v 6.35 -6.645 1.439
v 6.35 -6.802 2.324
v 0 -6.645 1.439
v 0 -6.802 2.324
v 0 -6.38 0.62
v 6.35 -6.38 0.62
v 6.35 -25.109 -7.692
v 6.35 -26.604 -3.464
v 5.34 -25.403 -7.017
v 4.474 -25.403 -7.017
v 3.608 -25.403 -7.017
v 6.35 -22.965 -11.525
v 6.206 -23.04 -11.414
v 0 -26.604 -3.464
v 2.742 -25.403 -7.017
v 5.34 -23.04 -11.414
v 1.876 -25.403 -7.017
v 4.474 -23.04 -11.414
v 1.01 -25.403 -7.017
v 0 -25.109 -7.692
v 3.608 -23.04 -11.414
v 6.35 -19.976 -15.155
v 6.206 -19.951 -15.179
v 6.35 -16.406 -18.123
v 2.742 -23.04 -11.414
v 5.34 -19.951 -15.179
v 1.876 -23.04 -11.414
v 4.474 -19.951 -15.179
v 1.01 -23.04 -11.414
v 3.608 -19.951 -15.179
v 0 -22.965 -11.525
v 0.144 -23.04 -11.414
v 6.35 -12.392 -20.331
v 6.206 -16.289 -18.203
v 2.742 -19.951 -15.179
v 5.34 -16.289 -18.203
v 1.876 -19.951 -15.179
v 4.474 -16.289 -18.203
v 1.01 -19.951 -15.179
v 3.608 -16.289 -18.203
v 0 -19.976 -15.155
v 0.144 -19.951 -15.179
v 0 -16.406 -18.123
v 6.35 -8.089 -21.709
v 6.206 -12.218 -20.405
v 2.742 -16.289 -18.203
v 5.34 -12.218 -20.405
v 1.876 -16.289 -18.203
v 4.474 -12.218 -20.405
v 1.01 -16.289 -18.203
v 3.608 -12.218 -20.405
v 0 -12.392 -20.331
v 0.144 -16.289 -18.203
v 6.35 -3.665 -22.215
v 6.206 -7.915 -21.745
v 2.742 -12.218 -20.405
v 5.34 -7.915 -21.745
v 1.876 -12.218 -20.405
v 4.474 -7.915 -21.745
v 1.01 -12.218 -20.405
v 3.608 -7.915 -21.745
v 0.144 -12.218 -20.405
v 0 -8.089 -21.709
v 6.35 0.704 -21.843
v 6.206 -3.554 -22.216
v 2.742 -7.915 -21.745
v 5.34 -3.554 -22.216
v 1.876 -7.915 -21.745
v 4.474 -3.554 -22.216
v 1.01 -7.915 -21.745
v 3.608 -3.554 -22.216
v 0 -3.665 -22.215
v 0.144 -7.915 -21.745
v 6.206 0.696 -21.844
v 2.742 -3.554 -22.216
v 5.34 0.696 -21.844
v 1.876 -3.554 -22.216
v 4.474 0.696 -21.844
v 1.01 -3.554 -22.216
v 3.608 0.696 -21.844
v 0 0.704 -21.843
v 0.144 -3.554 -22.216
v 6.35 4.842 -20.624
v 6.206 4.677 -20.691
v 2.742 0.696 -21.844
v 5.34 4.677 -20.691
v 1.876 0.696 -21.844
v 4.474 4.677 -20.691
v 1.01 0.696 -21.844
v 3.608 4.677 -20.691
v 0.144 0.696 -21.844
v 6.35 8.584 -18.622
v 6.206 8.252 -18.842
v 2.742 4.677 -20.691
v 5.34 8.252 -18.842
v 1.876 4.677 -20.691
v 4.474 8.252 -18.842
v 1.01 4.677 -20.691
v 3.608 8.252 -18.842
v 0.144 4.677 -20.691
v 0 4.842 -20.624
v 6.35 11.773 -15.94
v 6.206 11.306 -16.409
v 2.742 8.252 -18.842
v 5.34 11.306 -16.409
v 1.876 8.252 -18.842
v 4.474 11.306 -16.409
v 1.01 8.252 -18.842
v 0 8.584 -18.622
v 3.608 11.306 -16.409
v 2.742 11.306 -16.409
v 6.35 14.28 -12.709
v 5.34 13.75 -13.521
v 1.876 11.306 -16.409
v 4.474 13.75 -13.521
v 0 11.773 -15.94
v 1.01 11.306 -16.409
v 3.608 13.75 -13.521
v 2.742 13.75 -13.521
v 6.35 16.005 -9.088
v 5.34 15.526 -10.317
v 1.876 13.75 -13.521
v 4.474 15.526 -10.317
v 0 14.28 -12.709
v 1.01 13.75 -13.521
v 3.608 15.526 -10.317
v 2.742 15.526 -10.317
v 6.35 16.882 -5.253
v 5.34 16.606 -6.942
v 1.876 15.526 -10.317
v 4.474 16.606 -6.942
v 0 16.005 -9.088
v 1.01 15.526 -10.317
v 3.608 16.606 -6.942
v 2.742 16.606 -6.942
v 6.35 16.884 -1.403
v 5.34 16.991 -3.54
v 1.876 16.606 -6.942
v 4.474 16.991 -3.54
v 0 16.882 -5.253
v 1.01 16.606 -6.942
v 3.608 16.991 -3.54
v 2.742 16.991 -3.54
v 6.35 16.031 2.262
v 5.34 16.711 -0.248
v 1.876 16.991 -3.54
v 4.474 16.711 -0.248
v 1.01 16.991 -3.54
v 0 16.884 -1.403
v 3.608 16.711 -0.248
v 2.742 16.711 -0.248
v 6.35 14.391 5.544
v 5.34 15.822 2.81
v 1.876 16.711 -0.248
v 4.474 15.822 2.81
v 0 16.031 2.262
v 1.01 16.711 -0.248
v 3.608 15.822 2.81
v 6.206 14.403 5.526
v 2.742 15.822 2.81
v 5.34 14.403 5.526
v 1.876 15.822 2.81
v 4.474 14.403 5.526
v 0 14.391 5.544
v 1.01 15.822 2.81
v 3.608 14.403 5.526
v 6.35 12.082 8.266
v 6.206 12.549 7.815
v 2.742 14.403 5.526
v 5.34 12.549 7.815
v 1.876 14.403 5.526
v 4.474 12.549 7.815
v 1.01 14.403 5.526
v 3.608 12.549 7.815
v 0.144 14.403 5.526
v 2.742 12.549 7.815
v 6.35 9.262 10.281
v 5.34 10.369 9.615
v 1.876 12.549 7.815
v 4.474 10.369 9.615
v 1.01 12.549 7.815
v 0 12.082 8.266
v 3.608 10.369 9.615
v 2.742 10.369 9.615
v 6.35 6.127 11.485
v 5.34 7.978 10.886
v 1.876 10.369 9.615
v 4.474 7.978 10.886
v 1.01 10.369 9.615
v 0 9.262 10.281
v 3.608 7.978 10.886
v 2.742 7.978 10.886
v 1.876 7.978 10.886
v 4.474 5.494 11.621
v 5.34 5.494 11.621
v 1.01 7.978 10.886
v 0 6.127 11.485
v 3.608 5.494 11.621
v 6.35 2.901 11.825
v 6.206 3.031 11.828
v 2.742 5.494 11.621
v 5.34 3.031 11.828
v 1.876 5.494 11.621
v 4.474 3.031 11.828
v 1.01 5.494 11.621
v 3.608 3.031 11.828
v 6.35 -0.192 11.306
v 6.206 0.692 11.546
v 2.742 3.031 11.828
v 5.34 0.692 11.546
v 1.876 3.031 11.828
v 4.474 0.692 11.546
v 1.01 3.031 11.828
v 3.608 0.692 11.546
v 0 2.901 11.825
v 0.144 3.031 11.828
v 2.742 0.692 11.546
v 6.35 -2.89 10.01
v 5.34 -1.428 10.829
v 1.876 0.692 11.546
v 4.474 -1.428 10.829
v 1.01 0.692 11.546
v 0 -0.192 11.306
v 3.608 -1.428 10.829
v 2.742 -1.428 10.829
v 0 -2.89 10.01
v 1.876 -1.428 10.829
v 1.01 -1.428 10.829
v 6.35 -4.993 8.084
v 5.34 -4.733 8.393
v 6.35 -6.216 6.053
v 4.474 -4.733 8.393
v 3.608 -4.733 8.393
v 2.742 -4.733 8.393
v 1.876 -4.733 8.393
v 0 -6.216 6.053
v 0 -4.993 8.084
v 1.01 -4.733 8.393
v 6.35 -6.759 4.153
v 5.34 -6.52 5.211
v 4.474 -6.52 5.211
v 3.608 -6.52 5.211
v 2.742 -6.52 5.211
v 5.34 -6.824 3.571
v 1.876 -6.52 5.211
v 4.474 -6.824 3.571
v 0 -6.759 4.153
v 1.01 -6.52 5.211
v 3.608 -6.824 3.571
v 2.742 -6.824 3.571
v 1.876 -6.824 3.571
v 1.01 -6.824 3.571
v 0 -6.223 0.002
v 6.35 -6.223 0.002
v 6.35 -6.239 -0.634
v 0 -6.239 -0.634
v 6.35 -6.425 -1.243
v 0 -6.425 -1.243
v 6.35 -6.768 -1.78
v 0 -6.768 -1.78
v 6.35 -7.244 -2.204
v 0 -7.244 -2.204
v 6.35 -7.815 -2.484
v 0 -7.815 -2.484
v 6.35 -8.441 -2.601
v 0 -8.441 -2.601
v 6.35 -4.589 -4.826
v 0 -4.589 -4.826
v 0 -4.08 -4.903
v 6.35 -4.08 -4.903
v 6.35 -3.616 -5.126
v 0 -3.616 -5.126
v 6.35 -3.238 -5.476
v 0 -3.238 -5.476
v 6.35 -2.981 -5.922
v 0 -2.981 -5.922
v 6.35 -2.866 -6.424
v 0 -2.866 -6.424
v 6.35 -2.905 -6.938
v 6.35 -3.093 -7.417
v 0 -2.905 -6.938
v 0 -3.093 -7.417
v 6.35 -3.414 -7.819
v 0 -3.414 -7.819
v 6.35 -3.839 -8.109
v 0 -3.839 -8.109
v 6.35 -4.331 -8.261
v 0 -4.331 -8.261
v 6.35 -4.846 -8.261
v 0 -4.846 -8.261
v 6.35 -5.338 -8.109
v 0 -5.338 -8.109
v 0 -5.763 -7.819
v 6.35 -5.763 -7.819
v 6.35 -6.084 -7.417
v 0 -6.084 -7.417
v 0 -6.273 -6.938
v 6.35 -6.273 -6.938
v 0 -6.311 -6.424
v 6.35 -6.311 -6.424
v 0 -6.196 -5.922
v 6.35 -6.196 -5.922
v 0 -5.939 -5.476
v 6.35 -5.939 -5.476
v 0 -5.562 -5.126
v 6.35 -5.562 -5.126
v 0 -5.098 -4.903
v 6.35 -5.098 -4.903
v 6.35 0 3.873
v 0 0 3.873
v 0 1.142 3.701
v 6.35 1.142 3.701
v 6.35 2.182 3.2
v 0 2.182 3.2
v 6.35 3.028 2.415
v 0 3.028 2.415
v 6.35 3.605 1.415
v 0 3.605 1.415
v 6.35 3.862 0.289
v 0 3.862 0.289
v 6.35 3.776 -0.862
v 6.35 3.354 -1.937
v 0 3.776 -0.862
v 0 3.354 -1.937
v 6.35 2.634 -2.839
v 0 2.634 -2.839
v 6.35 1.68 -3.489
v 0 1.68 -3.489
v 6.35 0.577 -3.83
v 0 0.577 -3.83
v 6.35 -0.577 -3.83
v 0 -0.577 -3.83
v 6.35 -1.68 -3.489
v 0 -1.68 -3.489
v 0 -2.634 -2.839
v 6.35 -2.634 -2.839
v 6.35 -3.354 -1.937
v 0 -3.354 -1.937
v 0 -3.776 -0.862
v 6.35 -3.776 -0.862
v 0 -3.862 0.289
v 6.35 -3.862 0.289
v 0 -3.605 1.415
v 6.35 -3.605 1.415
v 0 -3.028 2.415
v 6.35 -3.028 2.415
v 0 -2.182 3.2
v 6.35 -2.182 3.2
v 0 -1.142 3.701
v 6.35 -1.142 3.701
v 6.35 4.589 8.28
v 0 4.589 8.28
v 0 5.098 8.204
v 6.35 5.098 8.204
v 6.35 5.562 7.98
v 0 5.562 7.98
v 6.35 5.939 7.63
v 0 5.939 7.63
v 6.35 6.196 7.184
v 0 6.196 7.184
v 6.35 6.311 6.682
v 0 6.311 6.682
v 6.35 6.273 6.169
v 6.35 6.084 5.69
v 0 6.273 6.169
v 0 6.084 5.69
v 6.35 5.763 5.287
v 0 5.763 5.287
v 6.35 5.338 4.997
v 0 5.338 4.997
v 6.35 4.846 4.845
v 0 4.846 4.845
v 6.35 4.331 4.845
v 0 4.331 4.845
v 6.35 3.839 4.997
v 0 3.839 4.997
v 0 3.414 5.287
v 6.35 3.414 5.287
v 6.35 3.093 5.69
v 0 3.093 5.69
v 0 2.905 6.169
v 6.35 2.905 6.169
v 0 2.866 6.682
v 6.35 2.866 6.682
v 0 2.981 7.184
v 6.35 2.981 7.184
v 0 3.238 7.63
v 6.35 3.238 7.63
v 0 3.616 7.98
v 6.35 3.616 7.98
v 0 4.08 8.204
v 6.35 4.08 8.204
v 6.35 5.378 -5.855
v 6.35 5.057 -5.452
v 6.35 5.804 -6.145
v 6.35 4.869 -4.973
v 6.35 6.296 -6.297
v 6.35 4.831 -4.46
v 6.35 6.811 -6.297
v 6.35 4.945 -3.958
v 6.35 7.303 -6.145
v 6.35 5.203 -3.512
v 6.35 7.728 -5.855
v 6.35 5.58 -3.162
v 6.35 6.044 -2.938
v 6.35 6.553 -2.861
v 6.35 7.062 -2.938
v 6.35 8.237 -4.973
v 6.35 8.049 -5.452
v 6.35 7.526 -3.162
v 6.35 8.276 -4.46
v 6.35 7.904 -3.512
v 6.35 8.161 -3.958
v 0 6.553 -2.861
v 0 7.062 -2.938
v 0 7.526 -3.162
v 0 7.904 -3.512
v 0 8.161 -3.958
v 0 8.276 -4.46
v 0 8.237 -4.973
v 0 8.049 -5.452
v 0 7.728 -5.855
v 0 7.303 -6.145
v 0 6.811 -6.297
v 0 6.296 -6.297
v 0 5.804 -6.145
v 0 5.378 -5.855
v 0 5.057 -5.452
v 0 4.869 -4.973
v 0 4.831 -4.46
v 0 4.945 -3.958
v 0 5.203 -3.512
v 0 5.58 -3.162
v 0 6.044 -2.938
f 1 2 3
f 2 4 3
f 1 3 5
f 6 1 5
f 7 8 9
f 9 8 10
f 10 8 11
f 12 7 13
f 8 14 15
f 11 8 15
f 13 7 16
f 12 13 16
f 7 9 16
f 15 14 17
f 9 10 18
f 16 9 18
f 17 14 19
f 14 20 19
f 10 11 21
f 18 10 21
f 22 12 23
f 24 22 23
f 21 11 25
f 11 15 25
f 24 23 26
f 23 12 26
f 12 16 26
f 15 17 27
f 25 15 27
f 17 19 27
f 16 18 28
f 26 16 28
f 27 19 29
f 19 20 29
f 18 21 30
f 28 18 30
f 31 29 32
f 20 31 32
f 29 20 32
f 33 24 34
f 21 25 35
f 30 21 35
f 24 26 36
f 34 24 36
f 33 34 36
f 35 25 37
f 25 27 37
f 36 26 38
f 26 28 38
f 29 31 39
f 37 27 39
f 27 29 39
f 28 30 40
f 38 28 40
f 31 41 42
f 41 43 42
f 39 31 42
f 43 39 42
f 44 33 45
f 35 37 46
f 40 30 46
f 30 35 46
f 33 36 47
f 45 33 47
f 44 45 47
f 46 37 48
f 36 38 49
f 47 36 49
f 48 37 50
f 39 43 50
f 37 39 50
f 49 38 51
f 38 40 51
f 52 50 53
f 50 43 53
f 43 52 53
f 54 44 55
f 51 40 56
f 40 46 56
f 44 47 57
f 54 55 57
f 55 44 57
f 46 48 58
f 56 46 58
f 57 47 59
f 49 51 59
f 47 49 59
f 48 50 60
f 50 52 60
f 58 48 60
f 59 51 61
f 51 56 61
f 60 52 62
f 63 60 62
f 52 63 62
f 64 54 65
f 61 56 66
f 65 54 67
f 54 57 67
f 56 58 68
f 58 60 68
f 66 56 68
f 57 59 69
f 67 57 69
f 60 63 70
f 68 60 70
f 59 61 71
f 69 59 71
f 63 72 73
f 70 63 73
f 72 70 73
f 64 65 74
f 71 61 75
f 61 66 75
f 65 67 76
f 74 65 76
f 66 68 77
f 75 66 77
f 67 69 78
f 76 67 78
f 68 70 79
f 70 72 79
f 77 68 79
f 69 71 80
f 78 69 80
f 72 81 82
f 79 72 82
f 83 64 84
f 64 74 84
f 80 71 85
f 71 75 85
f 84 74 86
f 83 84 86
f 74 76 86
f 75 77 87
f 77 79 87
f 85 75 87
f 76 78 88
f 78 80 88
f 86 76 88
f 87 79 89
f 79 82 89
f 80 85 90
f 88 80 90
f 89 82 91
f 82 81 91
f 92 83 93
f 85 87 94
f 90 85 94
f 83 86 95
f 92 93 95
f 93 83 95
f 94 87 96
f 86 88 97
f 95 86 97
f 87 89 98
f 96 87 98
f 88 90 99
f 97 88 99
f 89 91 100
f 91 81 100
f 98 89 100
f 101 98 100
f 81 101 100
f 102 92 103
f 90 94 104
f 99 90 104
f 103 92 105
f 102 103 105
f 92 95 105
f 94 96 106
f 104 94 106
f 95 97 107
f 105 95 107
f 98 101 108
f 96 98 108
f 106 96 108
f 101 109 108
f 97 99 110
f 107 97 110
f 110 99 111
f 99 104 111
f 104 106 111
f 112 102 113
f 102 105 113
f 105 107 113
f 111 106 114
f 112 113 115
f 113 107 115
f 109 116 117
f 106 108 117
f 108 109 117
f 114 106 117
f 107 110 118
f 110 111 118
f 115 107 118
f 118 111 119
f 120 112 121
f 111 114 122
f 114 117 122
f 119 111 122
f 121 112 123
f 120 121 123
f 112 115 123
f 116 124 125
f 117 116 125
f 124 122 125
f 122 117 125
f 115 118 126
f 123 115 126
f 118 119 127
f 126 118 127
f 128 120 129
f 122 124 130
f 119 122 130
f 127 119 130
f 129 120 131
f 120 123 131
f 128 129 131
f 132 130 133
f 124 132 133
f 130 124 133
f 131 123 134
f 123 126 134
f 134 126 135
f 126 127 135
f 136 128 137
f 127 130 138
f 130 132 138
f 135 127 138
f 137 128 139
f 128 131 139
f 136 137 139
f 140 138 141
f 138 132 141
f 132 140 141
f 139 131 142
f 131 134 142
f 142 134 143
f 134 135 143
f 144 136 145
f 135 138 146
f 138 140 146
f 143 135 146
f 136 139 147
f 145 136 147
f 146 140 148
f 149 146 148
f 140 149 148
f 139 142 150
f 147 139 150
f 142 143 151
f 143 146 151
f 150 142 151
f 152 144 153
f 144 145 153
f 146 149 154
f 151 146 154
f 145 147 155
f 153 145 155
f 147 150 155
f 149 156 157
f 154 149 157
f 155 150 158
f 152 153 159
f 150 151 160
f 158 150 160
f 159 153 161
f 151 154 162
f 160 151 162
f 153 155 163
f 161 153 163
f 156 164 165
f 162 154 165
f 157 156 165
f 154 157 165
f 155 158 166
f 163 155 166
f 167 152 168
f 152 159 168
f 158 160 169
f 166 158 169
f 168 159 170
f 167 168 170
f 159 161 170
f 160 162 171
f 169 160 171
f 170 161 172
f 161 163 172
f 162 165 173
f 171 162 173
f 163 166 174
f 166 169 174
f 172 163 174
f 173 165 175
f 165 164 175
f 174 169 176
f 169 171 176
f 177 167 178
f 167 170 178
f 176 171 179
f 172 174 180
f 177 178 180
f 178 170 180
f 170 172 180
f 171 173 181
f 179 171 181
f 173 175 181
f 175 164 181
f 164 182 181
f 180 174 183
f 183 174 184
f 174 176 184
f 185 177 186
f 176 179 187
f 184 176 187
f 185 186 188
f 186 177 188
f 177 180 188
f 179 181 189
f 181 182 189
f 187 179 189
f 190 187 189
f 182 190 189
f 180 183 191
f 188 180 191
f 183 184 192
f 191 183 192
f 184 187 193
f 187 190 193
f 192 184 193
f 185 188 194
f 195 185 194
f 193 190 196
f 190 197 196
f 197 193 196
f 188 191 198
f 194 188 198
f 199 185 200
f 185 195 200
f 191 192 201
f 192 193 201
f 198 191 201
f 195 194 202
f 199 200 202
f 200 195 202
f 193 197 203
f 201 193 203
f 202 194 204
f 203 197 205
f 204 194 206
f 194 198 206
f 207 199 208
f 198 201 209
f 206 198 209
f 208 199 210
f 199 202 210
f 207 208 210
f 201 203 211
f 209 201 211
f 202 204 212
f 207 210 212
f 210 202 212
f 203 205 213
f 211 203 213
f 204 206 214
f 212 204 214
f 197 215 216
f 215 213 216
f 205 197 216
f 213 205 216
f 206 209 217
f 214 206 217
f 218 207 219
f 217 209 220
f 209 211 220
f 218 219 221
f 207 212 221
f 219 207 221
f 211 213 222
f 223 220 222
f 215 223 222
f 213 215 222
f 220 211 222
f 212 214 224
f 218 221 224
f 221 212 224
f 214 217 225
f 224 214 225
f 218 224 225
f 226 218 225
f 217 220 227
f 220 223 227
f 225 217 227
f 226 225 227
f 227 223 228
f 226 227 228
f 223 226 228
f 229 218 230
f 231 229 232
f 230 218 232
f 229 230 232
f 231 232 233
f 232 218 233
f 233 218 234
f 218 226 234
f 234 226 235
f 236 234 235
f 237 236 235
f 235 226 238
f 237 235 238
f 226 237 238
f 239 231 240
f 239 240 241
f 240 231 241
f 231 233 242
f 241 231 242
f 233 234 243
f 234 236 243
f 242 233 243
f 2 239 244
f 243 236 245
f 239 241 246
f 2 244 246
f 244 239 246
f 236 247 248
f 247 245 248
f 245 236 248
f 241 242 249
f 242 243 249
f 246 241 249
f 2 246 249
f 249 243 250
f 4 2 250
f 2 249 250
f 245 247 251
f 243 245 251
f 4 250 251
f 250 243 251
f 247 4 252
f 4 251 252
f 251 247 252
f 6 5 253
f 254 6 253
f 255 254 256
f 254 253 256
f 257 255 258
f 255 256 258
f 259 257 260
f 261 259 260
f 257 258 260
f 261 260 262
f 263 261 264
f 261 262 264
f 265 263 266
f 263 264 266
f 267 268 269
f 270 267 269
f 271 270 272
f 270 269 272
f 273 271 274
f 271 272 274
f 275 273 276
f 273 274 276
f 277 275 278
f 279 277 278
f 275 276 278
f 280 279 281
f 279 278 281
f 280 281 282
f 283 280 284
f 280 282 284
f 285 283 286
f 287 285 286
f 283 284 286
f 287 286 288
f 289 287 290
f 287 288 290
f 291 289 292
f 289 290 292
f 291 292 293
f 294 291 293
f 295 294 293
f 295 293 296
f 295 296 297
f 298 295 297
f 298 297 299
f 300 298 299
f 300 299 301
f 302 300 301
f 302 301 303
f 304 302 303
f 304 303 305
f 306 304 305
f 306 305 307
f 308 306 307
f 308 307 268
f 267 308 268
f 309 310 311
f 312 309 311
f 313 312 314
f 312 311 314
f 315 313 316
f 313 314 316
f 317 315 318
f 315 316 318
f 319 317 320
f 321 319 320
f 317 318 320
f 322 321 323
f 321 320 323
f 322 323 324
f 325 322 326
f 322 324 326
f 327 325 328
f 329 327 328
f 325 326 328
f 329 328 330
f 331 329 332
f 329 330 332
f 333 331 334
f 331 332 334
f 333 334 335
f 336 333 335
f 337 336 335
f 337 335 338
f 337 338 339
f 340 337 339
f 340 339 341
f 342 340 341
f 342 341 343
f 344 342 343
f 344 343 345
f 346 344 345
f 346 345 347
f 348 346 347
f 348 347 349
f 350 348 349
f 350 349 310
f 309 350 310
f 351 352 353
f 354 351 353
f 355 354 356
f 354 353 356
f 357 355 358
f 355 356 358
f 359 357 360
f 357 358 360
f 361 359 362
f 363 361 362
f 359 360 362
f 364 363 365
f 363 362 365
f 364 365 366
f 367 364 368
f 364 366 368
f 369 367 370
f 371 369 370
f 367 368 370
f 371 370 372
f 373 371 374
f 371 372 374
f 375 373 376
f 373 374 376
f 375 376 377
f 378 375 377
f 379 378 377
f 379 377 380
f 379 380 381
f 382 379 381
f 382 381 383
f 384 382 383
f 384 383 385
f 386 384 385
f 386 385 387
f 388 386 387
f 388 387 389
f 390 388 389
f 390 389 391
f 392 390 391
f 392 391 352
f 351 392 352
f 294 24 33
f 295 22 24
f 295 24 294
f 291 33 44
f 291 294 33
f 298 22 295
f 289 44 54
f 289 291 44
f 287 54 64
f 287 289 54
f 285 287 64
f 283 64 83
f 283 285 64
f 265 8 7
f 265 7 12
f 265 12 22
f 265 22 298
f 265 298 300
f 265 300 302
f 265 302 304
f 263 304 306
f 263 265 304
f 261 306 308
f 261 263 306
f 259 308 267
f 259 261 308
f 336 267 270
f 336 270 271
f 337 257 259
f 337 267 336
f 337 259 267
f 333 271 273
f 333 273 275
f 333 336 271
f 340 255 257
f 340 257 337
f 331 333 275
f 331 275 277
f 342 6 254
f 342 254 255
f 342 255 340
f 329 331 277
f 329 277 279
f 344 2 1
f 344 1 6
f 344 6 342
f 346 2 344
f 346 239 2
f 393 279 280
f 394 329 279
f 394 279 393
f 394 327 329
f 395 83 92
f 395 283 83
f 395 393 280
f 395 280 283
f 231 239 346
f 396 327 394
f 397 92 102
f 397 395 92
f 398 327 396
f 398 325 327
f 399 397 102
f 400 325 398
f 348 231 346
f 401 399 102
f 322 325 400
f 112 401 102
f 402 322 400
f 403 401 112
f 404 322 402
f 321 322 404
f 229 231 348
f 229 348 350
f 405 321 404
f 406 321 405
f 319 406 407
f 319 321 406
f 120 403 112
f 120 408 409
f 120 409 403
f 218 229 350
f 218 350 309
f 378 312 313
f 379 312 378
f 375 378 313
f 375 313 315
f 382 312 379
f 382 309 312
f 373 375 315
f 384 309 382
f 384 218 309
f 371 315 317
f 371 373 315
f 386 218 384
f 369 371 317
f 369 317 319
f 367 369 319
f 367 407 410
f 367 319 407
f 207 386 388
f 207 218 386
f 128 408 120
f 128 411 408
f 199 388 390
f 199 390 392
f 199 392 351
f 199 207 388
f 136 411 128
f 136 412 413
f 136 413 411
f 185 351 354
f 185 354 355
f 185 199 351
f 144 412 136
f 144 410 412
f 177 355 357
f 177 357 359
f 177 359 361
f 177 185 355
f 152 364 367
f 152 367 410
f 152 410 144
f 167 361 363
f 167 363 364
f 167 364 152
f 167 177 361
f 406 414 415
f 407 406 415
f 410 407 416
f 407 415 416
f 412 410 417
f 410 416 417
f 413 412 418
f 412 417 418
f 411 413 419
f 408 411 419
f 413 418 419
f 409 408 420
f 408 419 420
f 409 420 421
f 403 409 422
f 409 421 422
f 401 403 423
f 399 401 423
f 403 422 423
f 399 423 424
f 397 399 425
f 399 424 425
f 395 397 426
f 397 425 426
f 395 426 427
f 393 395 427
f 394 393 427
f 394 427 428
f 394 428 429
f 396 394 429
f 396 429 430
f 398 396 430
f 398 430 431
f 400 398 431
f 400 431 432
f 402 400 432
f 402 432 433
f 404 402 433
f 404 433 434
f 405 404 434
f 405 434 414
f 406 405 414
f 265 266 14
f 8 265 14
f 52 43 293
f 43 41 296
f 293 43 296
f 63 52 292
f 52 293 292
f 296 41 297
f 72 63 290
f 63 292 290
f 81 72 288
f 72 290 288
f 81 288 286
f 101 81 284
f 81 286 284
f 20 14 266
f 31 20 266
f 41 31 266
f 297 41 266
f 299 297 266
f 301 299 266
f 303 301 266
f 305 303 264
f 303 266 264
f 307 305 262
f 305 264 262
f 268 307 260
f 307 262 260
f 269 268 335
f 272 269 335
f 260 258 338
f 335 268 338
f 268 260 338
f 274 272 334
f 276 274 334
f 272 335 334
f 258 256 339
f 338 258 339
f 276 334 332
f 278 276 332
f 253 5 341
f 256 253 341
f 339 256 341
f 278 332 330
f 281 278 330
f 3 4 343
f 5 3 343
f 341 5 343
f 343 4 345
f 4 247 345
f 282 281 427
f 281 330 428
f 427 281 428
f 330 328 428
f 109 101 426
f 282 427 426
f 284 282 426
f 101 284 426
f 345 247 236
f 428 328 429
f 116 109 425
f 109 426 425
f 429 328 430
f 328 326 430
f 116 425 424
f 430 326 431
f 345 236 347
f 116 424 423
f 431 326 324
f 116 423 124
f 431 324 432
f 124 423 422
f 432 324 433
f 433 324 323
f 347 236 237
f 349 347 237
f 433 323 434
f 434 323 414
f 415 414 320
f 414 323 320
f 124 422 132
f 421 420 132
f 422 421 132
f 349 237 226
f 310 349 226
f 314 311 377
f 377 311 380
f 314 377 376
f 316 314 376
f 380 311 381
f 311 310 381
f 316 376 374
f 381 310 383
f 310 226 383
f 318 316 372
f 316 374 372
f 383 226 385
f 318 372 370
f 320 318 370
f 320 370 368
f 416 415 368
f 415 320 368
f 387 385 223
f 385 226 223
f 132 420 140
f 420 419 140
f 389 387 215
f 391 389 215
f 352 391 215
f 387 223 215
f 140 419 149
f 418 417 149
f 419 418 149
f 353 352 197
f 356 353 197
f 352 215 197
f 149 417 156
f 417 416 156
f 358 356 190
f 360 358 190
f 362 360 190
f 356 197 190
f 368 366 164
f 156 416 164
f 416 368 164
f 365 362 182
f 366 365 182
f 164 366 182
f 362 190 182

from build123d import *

# Parameters (mm, degrees)
SKETCH4_R              = 3
BOSS_EXTRUDE1_DEPTH    = 6.35
MOVE_FACE1_OUTLINE_R   = 3
MOVE_FACE1_OUTLINE_R_2 = 2.7841
MOVE_FACE1_DEPTH       = 6.35
SKETCH11_R             = 1.7272
SKETCH11_R_2           = 3.873
CUT_EXTRUDE2_DEPTH     = 36.237722546


# Read off the part's stored shape, not the designer's step: Move Face1
with BuildPart() as part:
    # Sketch4 → Boss-Extrude1 (new body)
    with BuildSketch(Plane(origin=(0, 0, 0), x_dir=(0, 0, -1), z_dir=(1, 0, 0))):
        with BuildLine():
            Line((3.667013126, -26.3254835), (2.816473307, -8.431236894))
            ThreePointArc((2.816473307, -8.431236894), (1.639602622, -6.396649217), (-0.700777066, -6.179406175))
            add(Edge.make_bspline(
                [(-0.700777066, -6.179406175), (-1.525102008, -6.512822326), (-2.494871997, -6.679047096), (-4.555429578, -6.54165034), (-5.644996058, -6.237076936), (-7.717261628, -5.106975392), (-8.698405735, -4.281093265), (-10.311829803, -2.164612563), (-10.942499326, -0.874358563), (-11.647480976, 2.006859472), (-11.720427957, 3.596803483), (-11.182779689, 6.826310345), (-10.571334953, 8.46432492), (-9.132019695, 10.73433891), (-8.566197708, 11.459621106), (-7.273120414, 12.810057002), (-6.545872807, 13.435152517), (-4.948692799, 14.549748502), (-4.078780417, 15.039192621), (-2.22269385, 15.85074605), (-1.236551533, 16.172803424), (0.818678144, 16.623204755), (1.887722789, 16.751503646), (4.069669804, 16.79483508), (5.182520117, 16.709831654), (7.408648574, 16.315055224), (8.521867273, 16.00525724), (10.70264063, 15.158359498), (11.770130786, 14.621247223), (13.812561896, 13.326727542), (14.787435905, 12.56932106), (16.598938448, 10.850935673), (17.435500393, 9.889971566), (18.927885533, 7.790674993), (19.583645356, 6.652371052), (20.677096627, 4.233429246), (21.114730733, 2.952832896), (21.741586229, 0.292117033), (21.930758945, -1.087949282), (22.038932986, -3.898444365), (21.957896657, -5.328810088), (21.513783431, -8.186144708), (21.150681858, -9.613043017), (20.141400668, -12.407098951), (19.49521083, -13.774181132), (17.930076055, -16.391877744), (17.011136269, -17.642414844), (14.922264044, -19.972214517), (13.752352434, -21.051401006), (11.194349378, -22.98792657), (9.80629411, -23.845193985), (6.855009859, -25.29377098), (5.291831431, -25.88501641), (3.667013126, -26.3254835)],
                knots=[0, 0, 0, 0, 0.0625, 0.0625, 0.125, 0.125, 0.1875, 0.1875, 0.25, 0.25, 0.3125, 0.3125, 0.375, 0.375, 0.40625, 0.40625, 0.4375, 0.4375, 0.46875, 0.46875, 0.5, 0.5, 0.53125, 0.53125, 0.5625, 0.5625, 0.59375, 0.59375, 0.625, 0.625, 0.65625, 0.65625, 0.6875, 0.6875, 0.71875, 0.71875, 0.75, 0.75, 0.78125, 0.78125, 0.8125, 0.8125, 0.84375, 0.84375, 0.875, 0.875, 0.90625, 0.90625, 0.9375, 0.9375, 0.96875, 0.96875, 1, 1, 1, 1], degree=3))
        make_face()
        Circle(SKETCH4_R, mode=Mode.SUBTRACT)
    extrude(amount=BOSS_EXTRUDE1_DEPTH)

    # Move Face1 outline → Move Face1 (add)
    # profile 1 of 2: a face of its own
    with BuildSketch(Plane.YZ):
        with BuildLine():
            Line((-8.441487365, -2.600816779), (-26.604178645, -3.464116168))
            add(Edge.make_bspline(
                [(-26.604178645, -3.464116168), (-26.599569003, -3.481120458), (-26.594959362, -3.498124748), (-26.59034972, -3.515129038), (-26.585740078, -3.532133328), (-26.581130437, -3.549137618), (-26.576520795, -3.566141908), (-26.571911153, -3.583146198), (-26.567301512, -3.600150488), (-26.56269187, -3.617154778), (-26.558082228, -3.634159068), (-26.553472587, -3.651163358), (-26.548862945, -3.668167648), (-26.544253303, -3.685171938), (-26.53927128, -3.703549889), (-26.538898899, -3.704923549), (-26.538526517, -3.70629721), (-26.538154136, -3.707670871), (-26.537781754, -3.709044531), (-26.537409373, -3.710418192), (-26.537036991, -3.711791852), (-26.53666461, -3.713165513), (-26.536292228, -3.714539173), (-26.535919847, -3.715912834), (-26.535547465, -3.717286495), (-26.535175084, -3.718660155), (-26.534802702, -3.720033816), (-26.53424413, -3.722094307), (-26.534059907, -3.722773916), (-26.533858021, -3.723518442), (-26.533727067, -3.724001851), (-26.533440048, -3.725060798), (-26.533340537, -3.725426825), (-26.533133021, -3.726192717), (-26.532893488, -3.727076218), (-26.532782162, -3.727485594), (-26.532537582, -3.728388165), (-26.532375797, -3.728983938), (-26.532180677, -3.729703197), (-26.531993743, -3.730392017), (-26.531617908, -3.731776793), (-26.531429971, -3.732469173), (-26.531242014, -3.733161545), (-26.531054038, -3.733853909), (-26.530866042, -3.734546265), (-26.530678027, -3.735238614), (-26.530489992, -3.735930954), (-26.530301938, -3.736623286), (-26.530113864, -3.73731561), (-26.529925771, -3.738007927), (-26.529737659, -3.738700235), (-26.529549527, -3.739392535), (-26.529361375, -3.740084828), (-26.528420519, -3.74354625), (-26.527667523, -3.74631526), (-26.526914215, -3.749084142), (-26.526160594, -3.751852897), (-26.525406663, -3.754621524), (-26.524652417, -3.757390023), (-26.523897864, -3.760158394), (-26.523142994, -3.762926638), (-26.522387816, -3.765694753), (-26.521632324, -3.768462741), (-26.520876522, -3.7712306), (-26.520120408, -3.773998332), (-26.519363982, -3.776765936), (-26.517093769, -3.785068362), (-26.515579047, -3.790602801), (-26.514063078, -3.796136728), (-26.512545864, -3.801670141), (-26.511027403, -3.807203041), (-26.509507697, -3.812735429), (-26.507986745, -3.818267302), (-26.506464548, -3.823798661), (-26.504941106, -3.829329506), (-26.503416418, -3.834859837), (-26.501890486, -3.840389653), (-26.500363309, -3.845918954), (-26.498834888, -3.85144774), (-26.494245891, -3.868032549), (-26.491181583, -3.879087027), (-26.488112299, -3.890139439), (-26.485038042, -3.901189785), (-26.481958812, -3.912238061), (-26.478874612, -3.923284266), (-26.475785441, -3.934328398), (-26.472691304, -3.945370453), (-26.4695922, -3.956410431), (-26.466488131, -3.967448328), (-26.463379099, -3.978484142), (-26.460265106, -3.989517871), (-26.457146153, -4.000549514), (-26.441526593, -4.055697279), (-26.428951609, -4.099782062), (-26.416297387, -4.143833272), (-26.403564026, -4.187850766), (-26.390751622, -4.2318344), (-26.377860278, -4.275784033), (-26.364890086, -4.31969952), (-26.351841151, -4.363580717), (-26.338713566, -4.407427483), (-26.325507433, -4.451239673), (-26.312222848, -4.495017144), (-26.298859911, -4.538759754), (-26.285418719, -4.582467358), (-26.217821979, -4.800829638), (-26.162494118, -4.974957082), (-26.105922065, -5.148512984), (-26.048112096, -5.321488181), (-25.989070491, -5.49387351), (-25.928803524, -5.665659807), (-25.867317478, -5.836837911), (-25.804618624, -6.007398657), (-25.740713246, -6.177332884), (-25.675607616, -6.346631428), (-25.609308015, -6.515285126), (-25.541820718, -6.683284815), (-25.473152005, -6.850621333), (-25.263620445, -7.350613883), (-25.119234857, -7.681244245), (-24.970181526, -8.009184855), (-24.816563128, -8.334008567), (-24.658405438, -8.656540908), (-24.495574442, -8.975326705), (-24.328540305, -9.291435032), (-24.157090549, -9.604622916), (-23.981161893, -9.914157206), (-23.801250109, -10.220890306), (-23.616969066, -10.524098117), (-23.428657045, -10.824036045), (-23.23626742, -11.120542818), (-22.843508974, -11.706612059), (-22.643142176, -11.996174333), (-22.438808393, -12.282198027), (-22.230723583, -12.56460565), (-22.018648797, -12.843459923), (-21.802917467, -13.118447754), (-21.583605212, -13.389644606), (-21.360601243, -13.657176078), (-21.134077845, -13.920797741), (-20.904199437, -14.180403567), (-20.670850853, -14.43621903), (-20.434249131, -14.687936687), (-20.194399706, -14.935644556), (-19.70838235, -15.42287054), (-19.462215458, -15.662397811), (-19.212931723, -15.897766285), (-18.960728671, -16.128991264), (-18.70539447, -16.355994955), (-18.447304202, -16.578625492), (-18.186499944, -16.796967202), (-17.922857209, -17.011060359), (-17.656599224, -17.220738444), (-17.387896766, -17.42596103), (-17.116588056, -17.626860373), (-16.842954408, -17.82323191), (-16.566974945, -18.015139117), (-16.010532784, -18.389907039), (-15.730066911, -18.572777232), (-15.447424653, -18.751061226), (-15.162746667, -18.924851219), (-14.875916093, -19.093949929), (-14.587276398, -19.258367365), (-14.296840097, -19.418183126), (-14.004513923, -19.573354608), (-13.710535007, -19.723805382), (-13.415054471, -19.869556513), (-13.117916757, -20.010637113), (-12.819417073, -20.146961011), (-12.519527346, -20.278558541), (-11.917189037, -20.532242336), (-11.614733643, -20.65433651), (-11.311086848, -20.771622769), (-11.006314451, -20.884236095), (-10.700430715, -20.991914806), (-10.39369458, -21.094796517), (-10.086097937, -21.192946197), (-9.777608438, -21.286263743), (-9.468444303, -21.374756831), (-9.158720169, -21.458492374), (-8.848328151, -21.537414262), (-8.537533287, -21.611545146), (-8.226317575, -21.68088471), (-7.603260387, -21.809981168), (-7.291409675, -21.869743076), (-6.979352707, -21.924681004), (-6.667077965, -21.974937355), (-6.354741362, -22.020247701), (-6.042483137, -22.060828702), (-5.730286129, -22.096726163), (-5.418195248, -22.127815836), (-5.10638259, -22.154172495), (-4.794917194, -22.175889882), (-4.483768614, -22.19285834), (-4.173135796, -22.205184806), (-3.863025065, -22.212847752), (-3.244042, -22.218898546), (-2.935160635, -22.217283683), (-2.627009812, -22.211051294), (-2.319535889, -22.200221076), (-2.012978585, -22.184764162), (-1.707390049, -22.164745089), (-1.402745405, -22.140231054), (-1.099140461, -22.111224435), (-0.796711927, -22.077727229), (-0.495491172, -22.03980106), (-0.195495425, -21.997498698), (0.103120125, -21.950796576), (0.400341286, -21.899765548), (0.991819558, -21.789077387), (1.28608355, -21.729419077), (1.578768432, -21.665496674), (1.869917455, -21.597302553), (2.159298453, -21.524877058), (2.446882891, -21.44828864), (2.732707168, -21.367584679), (3.016672969, -21.282790594), (3.298648908, -21.193943649), (3.578623787, -21.101102717), (3.85659217, -21.004314712), (4.132391722, -20.903599993), (4.406031128, -20.799020335), (4.948821205, -20.582201458), (5.217977174, -20.469959264), (5.484813738, -20.353954278), (5.749350964, -20.234161295), (6.01138819, -20.110681465), (6.270917632, -19.983580155), (6.527976619, -19.852885482), (6.782472092, -19.718646938), (7.034289441, -19.580933449), (7.283432367, -19.43979613), (7.529901875, -19.295274808), (7.77354503, -19.147434253), (8.014385292, -18.996321733), (8.490309508, -18.687660003), (8.725396651, -18.530106846), (8.957555599, -18.369412167), (9.186776625, -18.205547192), (9.412909718, -18.038656901), (9.635962414, -17.868799381), (9.855964095, -17.695988596), (10.072835585, -17.520295455), (10.286488685, -17.341812823), (10.496935081, -17.160582706), (10.704177349, -16.976639307), (10.908088748, -16.790084702), (11.108697582, -16.60095136), (11.503188846, -16.217665056), (11.697072069, -16.023508272), (11.887567215, -15.826919792), (12.074634411, -15.627883555), (12.258185431, -15.42656542), (12.438237852, -15.223014525), (12.614807781, -15.017239038), (12.787836646, -14.809325702), (12.957268738, -14.599380603), (13.123118176, -14.387438261), (13.285386007, -14.173530705), (13.443983714, -13.9577844), (13.598936774, -13.740220791), (13.901469825, -13.301617581), (14.049048428, -13.080575457), (14.192938252, -12.85786673), (14.333075884, -12.633504041), (14.469436513, -12.407648424), (14.602043246, -12.180340569), (14.730898025, -11.951592848), (14.855967044, -11.721500116), (14.977228845, -11.490169384), (15.094696526, -11.257631481), (15.208368824, -11.023920803), (15.318201343, -10.789171515), (15.424212302, -10.553400689), (15.62854924, -10.079983096), (15.726872378, -9.842336108), (15.821368333, -9.603809457), (15.911963677, -9.364456828), (15.998688398, -9.124410274), (16.081568069, -8.883704025), (16.160594519, -8.642364015), (16.235759672, -8.400484565), (16.307073362, -8.15816166), (16.374546973, -7.915427103), (16.438178826, -7.672322007), (16.497967314, -7.428970727), (16.553923089, -7.185393613), (16.658169192, -6.697950384), (16.706458163, -6.454088263), (16.750931294, -6.210116308), (16.791551227, -5.966156004), (16.828352164, -5.722265003), (16.861371473, -5.478483856), (16.89061727, -5.234873215), (16.916091026, -4.991505669), (16.937812625, -4.748444975), (16.955811803, -4.505744551), (16.970101403, -4.263463823), (16.98068149, -4.021672476), (16.987586075, -3.780425869), (16.994060031, -3.299148156), (16.993631026, -3.059123221), (16.989555385, -2.819737011), (16.981828074, -2.581119041), (16.97049256, -2.343310945), (16.955590155, -2.106340667), (16.937140606, -1.870268338), (16.91516095, -1.635166239), (16.889682937, -1.401088709), (16.860744509, -1.168076804), (16.828369507, -0.936186685), (16.792572797, -0.705489655), (16.753396921, -0.476025059), (16.668327332, -0.019684131), (16.622436928, 0.207187985), (16.573210516, 0.43274012), (16.520676595, 0.656845924), (16.464882551, 0.879479604), (16.405870334, 1.100624284), (16.3436718, 1.320223268), (16.278319602, 1.538208936), (16.209854217, 1.754538123), (16.138317988, 1.969182142), (16.063745228, 2.182090339), (15.986166539, 2.393194111), (15.905627626, 2.602469813), (15.738694717, 3.017250287), (15.652304686, 3.222753348), (15.563011722, 3.426348397), (15.470874943, 3.627923175), (15.375941264, 3.827466031), (15.27825116, 4.024968988), (15.177848129, 4.22038201), (15.074779017, 4.413646484), (14.969089842, 4.604731213), (14.860824208, 4.793618869), (14.750025822, 4.980266585), (14.6367404, 5.164613119), (14.521012434, 5.346648599), (14.284759964, 5.705997611), (14.164238936, 5.88331198), (14.041346931, 6.058244698), (13.916166576, 6.230707349), (13.788741729, 6.400699169), (13.659110682, 6.568218603), (13.527326668, 6.733225876), (13.393447683, 6.895675454), (13.257522548, 7.055547765), (13.11959423, 7.212834846), (12.979713874, 7.367503996), (12.837939646, 7.519506253), (12.694312503, 7.668841812), (12.403459758, 7.962101433), (12.256236093, 8.106028416), (12.107245062, 8.247230378), (11.956582639, 8.385649016), (11.804288588, 8.521291455), (11.65039943, 8.654160681), (11.494975113, 8.78422985), (11.338080513, 8.911469301), (11.179764974, 9.035870418), (11.020069941, 9.157432821), (10.859051406, 9.276135657), (10.696775757, 9.391945779), (10.53327979, 9.504870215), (10.348041361, 9.62863484), (10.327440973, 9.642341074), (10.306822731, 9.656001739), (10.286186731, 9.669616814), (10.265532905, 9.683186339), (10.244861188, 9.696710349), (10.224171615, 9.710188832), (10.203464367, 9.723621723), (10.182739741, 9.737008906), (10.161998068, 9.750350261), (10.141239561, 9.763645725), (10.12046411, 9.776895389), (10.099671, 9.79009961), (10.058046161, 9.81641871), (10.037217098, 9.829531834), (10.016371494, 9.842598537), (9.995509453, 9.855618821), (9.974631077, 9.868592692), (9.953736471, 9.881520152), (9.932825737, 9.894401206), (9.911898978, 9.907235857), (9.890956298, 9.920024109), (9.869997801, 9.932765967), (9.849023589, 9.945461434), (9.828033765, 9.958110514), (9.807028434, 9.97071321), (9.743966224, 10.00838216), (9.701863133, 10.033309276), (9.659699249, 10.058050905), (9.617475395, 10.082607077), (9.575192397, 10.106977826), (9.532851077, 10.131163181), (9.490452261, 10.155163174), (9.447996771, 10.178977836), (9.405485434, 10.202607198), (9.362919072, 10.226051291), (9.320298511, 10.249310147), (9.277624573, 10.272383796), (9.234898083, 10.29527227), (9.106563432, 10.363382261), (9.020800116, 10.408048353), (8.934836483, 10.451974125), (8.848679096, 10.495159823), (8.762334519, 10.537605698), (8.675809318, 10.579311995), (8.589110055, 10.620278965), (8.502243296, 10.660506853), (8.415215603, 10.699995909), (8.328033542, 10.73874638), (8.240703676, 10.776758515), (8.15323257, 10.814032561), (8.065626787, 10.850568766), (7.802425101, 10.957964605), (7.626444742, 11.026611369), (7.450004147, 11.092309662), (7.27315561, 11.155061426), (7.095951384, 11.214868552), (6.918443686, 11.271732888), (6.740684687, 11.325656229), (6.562726523, 11.376640328), (6.384621288, 11.424686885), (6.206421038, 11.469797554), (6.028177787, 11.511973941), (5.84994351, 11.551217606), (5.671770144, 11.587530057), (5.315649022, 11.654295458), (5.137728602, 11.684747226), (4.959700016, 11.712299475), (4.783019884, 11.736712222), (4.604276011, 11.758891306), (4.429464411, 11.777036031), (4.250811556, 11.793890793), (4.076436597, 11.806370641), (3.899761626, 11.817263639), (3.725133165, 11.824666119), (3.550410334, 11.829638498), (3.37648165, 11.831780195), (3.203155326, 11.831236863), (2.857881444, 11.824777298), (2.685930065, 11.818863209), (2.51470827, 11.810286856), (2.344260063, 11.799070213), (2.174629427, 11.785235191), (2.005860324, 11.768803637), (1.837996698, 11.749797331), (1.671082472, 11.728237989), (1.50516155, 11.704147262), (1.340277816, 11.677546737), (1.176475132, 11.648457935), (1.013797343, 11.616902313), (0.852288272, 11.582901263), (0.61184345, 11.528263534), (0.53200571, 11.509447542), (0.452431498, 11.490014724), (0.373262519, 11.470000825), (0.294382178, 11.449393041), (0.215797381, 11.428191413), (0.137577788, 11.406409742), (0.059709652, 11.384053465), (-0.017850954, 11.361120913), (-0.095072103, 11.33761765), (-0.171912733, 11.313553202), (-0.248433789, 11.288926884), (-0.324588602, 11.263745774), (-0.476187787, 11.21228181), (-0.551629997, 11.185999058), (-0.626711201, 11.159170067), (-0.701427774, 11.131799368), (-0.775776089, 11.103891494), (-0.849752523, 11.075450975), (-0.92335345, 11.046482344), (-0.996575245, 11.016990131), (-1.069414282, 10.986978867), (-1.141866938, 10.956453085), (-1.213929586, 10.925417316), (-1.285598602, 10.89387609), (-1.35687036, 10.86183394), (-1.569482988, 10.764218312), (-1.709621229, 10.697155476), (-1.848127108, 10.628143005), (-1.98497177, 10.557216936), (-2.120126347, 10.484413233), (-2.253561967, 10.409767786), (-2.385249746, 10.333316406), (-2.515160795, 10.255094835), (-2.643266216, 10.175138734), (-2.769537102, 10.093483694), (-2.893944539, 10.010165228), (-3.016459604, 9.925218776), (-3.137053367, 9.838679702), (-3.315018649, 9.706535092), (-3.373849905, 9.662101445), (-3.432225085, 9.617246491), (-3.489973308, 9.572127532), (-3.547384771, 9.52651408), (-3.604222119, 9.480589049), (-3.660493818, 9.43435795), (-3.716362737, 9.387700649), (-3.771715305, 9.340702599), (-3.826473613, 9.293429538), (-3.880830859, 9.245743042), (-3.934616774, 9.197770987), (-3.987913252, 9.149459099), (-4.093478067, 9.052199488), (-4.145749357, 9.003249721), (-4.19750826, 8.953985292), (-4.248753506, 8.904411497), (-4.299483825, 8.854533635), (-4.349697947, 8.804357003), (-4.399394603, 8.753886901), (-4.448572522, 8.703128624), (-4.497230434, 8.652087473), (-4.545367069, 8.600768744), (-4.592981158, 8.549177736), (-4.640071431, 8.497319746), (-4.686636617, 8.445200073), (-4.824753105, 8.288071896), (-4.914725275, 8.182294046), (-5.002581891, 8.075532644), (-5.088312844, 7.967829797), (-5.171907984, 7.859227538), (-5.253357116, 7.749767825), (-5.332650002, 7.639492543), (-5.409776362, 7.528443501), (-5.48472587, 7.416662437), (-5.55748816, 7.304191013), (-5.628052821, 7.191070818), (-5.696409398, 7.077343365), (-5.762547394, 6.963050096), (-5.890365144, 6.733414655), (-5.952053709, 6.61804774), (-6.011379226, 6.5024593), (-6.068789532, 6.385932229), (-6.123482319, 6.2698429), (-6.176476599, 6.152615371), (-6.226996856, 6.035513752), (-6.275228474, 5.918322644), (-6.321621575, 5.800380212), (-6.365473581, 5.682832438), (-6.407390636, 5.564799764), (-6.447052072, 5.446825396), (-6.484587524, 5.328765169), (-6.55536853, 5.092635858), (-6.588616961, 4.974562342), (-6.619731944, 4.856519728), (-6.64872202, 4.73854772), (-6.675595644, 4.620685966), (-6.700361191, 4.50297406), (-6.723026952, 4.385451536), (-6.743601132, 4.268157874), (-6.762091856, 4.151132495), (-6.778507164, 4.034414767), (-6.792855012, 3.918043998), (-6.805143275, 3.802059442), (-6.815379741, 3.686500296), (-6.839956872, 3.341216503), (-6.848154204, 3.113073347), (-6.848438469, 2.887099769), (-6.84084938, 2.663718746), (-6.825763132, 2.443005573), (-6.803253008, 2.225285636), (-6.773501282, 2.01082461), (-6.73678547, 1.799796855), (-6.69324338, 1.592468222), (-6.643018498, 1.389115017), (-6.586393416, 1.18991247), (-6.52346955, 0.995146747), (-6.454467342, 0.805035191), (-6.379554183, 0.619822851)],
                knots=[-0.001662915, -0.001662915, -0.001662915, -0.001662915, -0.001662915, -0.001662915, -0.001662915, -0.001662915, -0.001662915, -0.001662915, -0.001662915, -0.001662915, -0.001662915, -0.001662915, -0.001662915, -0.000136719, -0.000136719, -0.000136719, -0.000136719, -0.000136719, -0.000136719, -0.000136719, -0.000136719, -0.000136719, -0.000136719, -0.000136719, -0.000136719, -0.000136719, -1.3428e-05, -1.3428e-05, -1.3428e-05, -1.3428e-05, -1.3428e-05, -1.3428e-05, -1.3428e-05, -1.3428e-05, -1.3428e-05, -1.3428e-05, -1.3428e-05, -1.3428e-05, -1.3428e-05, 4.8218e-05, 4.8218e-05, 4.8218e-05, 4.8218e-05, 4.8218e-05, 4.8218e-05, 4.8218e-05, 4.8218e-05, 4.8218e-05, 4.8218e-05, 4.8218e-05, 4.8218e-05, 4.8218e-05, 0.000109863, 0.000109863, 0.000109863, 0.000109863, 0.000109863, 0.000109863, 0.000109863, 0.000109863, 0.000109863, 0.000109863, 0.000109863, 0.000109863, 0.000109863, 0.000356445, 0.000356445, 0.000356445, 0.000356445, 0.000356445, 0.000356445, 0.000356445, 0.000356445, 0.000356445, 0.000356445, 0.000356445, 0.000356445, 0.000356445, 0.000849609, 0.000849609, 0.000849609, 0.000849609, 0.000849609, 0.000849609, 0.000849609, 0.000849609, 0.000849609, 0.000849609, 0.000849609, 0.000849609, 0.000849609, 0.001835937, 0.001835937, 0.001835937, 0.001835937, 0.001835937, 0.001835937, 0.001835937, 0.001835937, 0.001835937, 0.001835937, 0.001835937, 0.001835937, 0.001835937, 0.00578125, 0.00578125, 0.00578125, 0.00578125, 0.00578125, 0.00578125, 0.00578125, 0.00578125, 0.00578125, 0.00578125, 0.00578125, 0.00578125, 0.00578125, 0.0215625, 0.0215625, 0.0215625, 0.0215625, 0.0215625, 0.0215625, 0.0215625, 0.0215625, 0.0215625, 0.0215625, 0.0215625, 0.0215625, 0.0215625, 0.053125, 0.053125, 0.053125, 0.053125, 0.053125, 0.053125, 0.053125, 0.053125, 0.053125, 0.053125, 0.053125, 0.053125, 0.053125, 0.0846875, 0.0846875, 0.0846875, 0.0846875, 0.0846875, 0.0846875, 0.0846875, 0.0846875, 0.0846875, 0.0846875, 0.0846875, 0.0846875, 0.0846875, 0.11625, 0.11625, 0.11625, 0.11625, 0.11625, 0.11625, 0.11625, 0.11625, 0.11625, 0.11625, 0.11625, 0.11625, 0.11625, 0.1478125, 0.1478125, 0.1478125, 0.1478125, 0.1478125, 0.1478125, 0.1478125, 0.1478125, 0.1478125, 0.1478125, 0.1478125, 0.1478125, 0.1478125, 0.179375, 0.179375, 0.179375, 0.179375, 0.179375, 0.179375, 0.179375, 0.179375, 0.179375, 0.179375, 0.179375, 0.179375, 0.179375, 0.2109375, 0.2109375, 0.2109375, 0.2109375, 0.2109375, 0.2109375, 0.2109375, 0.2109375, 0.2109375, 0.2109375, 0.2109375, 0.2109375, 0.2109375, 0.2425, 0.2425, 0.2425, 0.2425, 0.2425, 0.2425, 0.2425, 0.2425, 0.2425, 0.2425, 0.2425, 0.2425, 0.2425, 0.2740625, 0.2740625, 0.2740625, 0.2740625, 0.2740625, 0.2740625, 0.2740625, 0.2740625, 0.2740625, 0.2740625, 0.2740625, 0.2740625, 0.2740625, 0.305625, 0.305625, 0.305625, 0.305625, 0.305625, 0.305625, 0.305625, 0.305625, 0.305625, 0.305625, 0.305625, 0.305625, 0.305625, 0.3371875, 0.3371875, 0.3371875, 0.3371875, 0.3371875, 0.3371875, 0.3371875, 0.3371875, 0.3371875, 0.3371875, 0.3371875, 0.3371875, 0.3371875, 0.36875, 0.36875, 0.36875, 0.36875, 0.36875, 0.36875, 0.36875, 0.36875, 0.36875, 0.36875, 0.36875, 0.36875, 0.36875, 0.4003125, 0.4003125, 0.4003125, 0.4003125, 0.4003125, 0.4003125, 0.4003125, 0.4003125, 0.4003125, 0.4003125, 0.4003125, 0.4003125, 0.4003125, 0.431875, 0.431875, 0.431875, 0.431875, 0.431875, 0.431875, 0.431875, 0.431875, 0.431875, 0.431875, 0.431875, 0.431875, 0.431875, 0.4634375, 0.4634375, 0.4634375, 0.4634375, 0.4634375, 0.4634375, 0.4634375, 0.4634375, 0.4634375, 0.4634375, 0.4634375, 0.4634375, 0.4634375, 0.495, 0.495, 0.495, 0.495, 0.495, 0.495, 0.495, 0.495, 0.495, 0.495, 0.495, 0.495, 0.495, 0.5265625, 0.5265625, 0.5265625, 0.5265625, 0.5265625, 0.5265625, 0.5265625, 0.5265625, 0.5265625, 0.5265625, 0.5265625, 0.5265625, 0.5265625, 0.558125, 0.558125, 0.558125, 0.558125, 0.558125, 0.558125, 0.558125, 0.558125, 0.558125, 0.558125, 0.558125, 0.558125, 0.558125, 0.5896875, 0.5896875, 0.5896875, 0.5896875, 0.5896875, 0.5896875, 0.5896875, 0.5896875, 0.5896875, 0.5896875, 0.5896875, 0.5896875, 0.5896875, 0.62125, 0.62125, 0.62125, 0.62125, 0.62125, 0.62125, 0.62125, 0.62125, 0.62125, 0.62125, 0.62125, 0.62125, 0.62125, 0.625195313, 0.625195313, 0.625195313, 0.625195313, 0.625195313, 0.625195313, 0.625195313, 0.625195313, 0.625195313, 0.625195313, 0.625195313, 0.625195313, 0.625195313, 0.629140625, 0.629140625, 0.629140625, 0.629140625, 0.629140625, 0.629140625, 0.629140625, 0.629140625, 0.629140625, 0.629140625, 0.629140625, 0.629140625, 0.629140625, 0.63703125, 0.63703125, 0.63703125, 0.63703125, 0.63703125, 0.63703125, 0.63703125, 0.63703125, 0.63703125, 0.63703125, 0.63703125, 0.63703125, 0.63703125, 0.6528125, 0.6528125, 0.6528125, 0.6528125, 0.6528125, 0.6528125, 0.6528125, 0.6528125, 0.6528125, 0.6528125, 0.6528125, 0.6528125, 0.6528125, 0.684375, 0.684375, 0.684375, 0.684375, 0.684375, 0.684375, 0.684375, 0.684375, 0.684375, 0.684375, 0.684375, 0.684375, 0.684375, 0.7159375, 0.7159375, 0.7159375, 0.7159375, 0.7159375, 0.7159375, 0.7159375, 0.7159375, 0.7159375, 0.7159375, 0.7159375, 0.7159375, 0.7159375, 0.7475, 0.7475, 0.7475, 0.7475, 0.7475, 0.7475, 0.7475, 0.7475, 0.7475, 0.7475, 0.7475, 0.7475, 0.7475, 0.76328125, 0.76328125, 0.76328125, 0.76328125, 0.76328125, 0.76328125, 0.76328125, 0.76328125, 0.76328125, 0.76328125, 0.76328125, 0.76328125, 0.76328125, 0.7790625, 0.7790625, 0.7790625, 0.7790625, 0.7790625, 0.7790625, 0.7790625, 0.7790625, 0.7790625, 0.7790625, 0.7790625, 0.7790625, 0.7790625, 0.810625, 0.810625, 0.810625, 0.810625, 0.810625, 0.810625, 0.810625, 0.810625, 0.810625, 0.810625, 0.810625, 0.810625, 0.810625, 0.82640625, 0.82640625, 0.82640625, 0.82640625, 0.82640625, 0.82640625, 0.82640625, 0.82640625, 0.82640625, 0.82640625, 0.82640625, 0.82640625, 0.82640625, 0.8421875, 0.8421875, 0.8421875, 0.8421875, 0.8421875, 0.8421875, 0.8421875, 0.8421875, 0.8421875, 0.8421875, 0.8421875, 0.8421875, 0.8421875, 0.87375, 0.87375, 0.87375, 0.87375, 0.87375, 0.87375, 0.87375, 0.87375, 0.87375, 0.87375, 0.87375, 0.87375, 0.87375, 0.9053125, 0.9053125, 0.9053125, 0.9053125, 0.9053125, 0.9053125, 0.9053125, 0.9053125, 0.9053125, 0.9053125, 0.9053125, 0.9053125, 0.9053125, 0.936875, 0.936875, 0.936875, 0.936875, 0.936875, 0.936875, 0.936875, 0.936875, 0.936875, 0.936875, 0.936875, 0.936875, 0.936875, 1, 1, 1, 1, 1, 1, 1, 1, 1, 1, 1, 1, 1, 1, 1], degree=14))
            ThreePointArc((-6.379554183, 0.619822851), (-6.578477057, -1.52319194), (-8.441487365, -2.600816779))
        make_face()
        with BuildLine():
            add(Edge.make_bspline(
                [(-26.3254835, -3.667013126), (-25.88501641, -5.291831431), (-25.29377098, -6.855009859), (-23.845193985, -9.80629411), (-22.98792657, -11.194349378), (-21.051401006, -13.752352434), (-19.972214517, -14.922264044), (-17.642414844, -17.011136269), (-16.391877744, -17.930076055), (-13.774181132, -19.49521083), (-12.407098951, -20.141400668), (-9.613043017, -21.150681858), (-8.186144708, -21.513783431), (-5.328810088, -21.957896657), (-3.898444365, -22.038932986), (-1.087949282, -21.930758945), (0.292117033, -21.741586229), (2.952832896, -21.114730733), (4.233429246, -20.677096627), (6.652371052, -19.583645356), (7.790674993, -18.927885533), (9.889971566, -17.435500393), (10.850935673, -16.598938448), (12.56932106, -14.787435905), (13.326727542, -13.812561896), (14.621247223, -11.770130786), (15.158359498, -10.70264063), (16.00525724, -8.521867273), (16.315055224, -7.408648574), (16.709831654, -5.182520117), (16.79483508, -4.069669804), (16.751503646, -1.887722789), (16.623204755, -0.818678144), (16.172803424, 1.236551533), (15.85074605, 2.22269385), (15.039192621, 4.078780417), (14.549748502, 4.948692799), (13.435152517, 6.545872807), (12.810057002, 7.273120414), (11.459621106, 8.566197708), (10.73433891, 9.132019695), (8.46432492, 10.571334953), (6.826310345, 11.182779689), (3.596803483, 11.720427957), (2.006859472, 11.647480976), (-0.874358563, 10.942499326), (-2.164612563, 10.311829803), (-4.281093265, 8.698405735), (-5.106975392, 7.717261628), (-6.237076936, 5.644996058), (-6.54165034, 4.555429578), (-6.679047096, 2.494871997), (-6.512822326, 1.525102008), (-6.179406175, 0.700777066)],
                knots=[0, 0, 0, 0, 0.03125, 0.03125, 0.0625, 0.0625, 0.09375, 0.09375, 0.125, 0.125, 0.15625, 0.15625, 0.1875, 0.1875, 0.21875, 0.21875, 0.25, 0.25, 0.28125, 0.28125, 0.3125, 0.3125, 0.34375, 0.34375, 0.375, 0.375, 0.40625, 0.40625, 0.4375, 0.4375, 0.46875, 0.46875, 0.5, 0.5, 0.53125, 0.53125, 0.5625, 0.5625, 0.59375, 0.59375, 0.625, 0.625, 0.6875, 0.6875, 0.75, 0.75, 0.8125, 0.8125, 0.875, 0.875, 0.9375, 0.9375, 1, 1, 1, 1], degree=3))
            Line((-26.3254835, -3.667013126), (-8.431236894, -2.816473307))
            ThreePointArc((-8.431236894, -2.816473307), (-6.396649217, -1.639602622), (-6.179406175, 0.700777066))
        make_face(mode=Mode.SUBTRACT)
    # profile 2 of 2: a face of its own
    with BuildSketch(Plane.YZ):
        Circle(MOVE_FACE1_OUTLINE_R)
        Circle(MOVE_FACE1_OUTLINE_R_2, mode=Mode.SUBTRACT)
    extrude(amount=MOVE_FACE1_DEPTH)

    # Sketch11 → Cut-Extrude2 (cut, through all)
    with BuildSketch(Plane.ZY):
        with Locations((-6.553216354, -4.588611491)):
            Circle(SKETCH11_R)
        with Locations((-4.588611491, 6.553216354)):
            Circle(SKETCH11_R)
        with Locations((6.553216354, 4.588611491)):
            Circle(SKETCH11_R)
        Circle(SKETCH11_R_2)
    extrude(amount=-CUT_EXTRUDE2_DEPTH, mode=Mode.SUBTRACT)


solid = part.part
